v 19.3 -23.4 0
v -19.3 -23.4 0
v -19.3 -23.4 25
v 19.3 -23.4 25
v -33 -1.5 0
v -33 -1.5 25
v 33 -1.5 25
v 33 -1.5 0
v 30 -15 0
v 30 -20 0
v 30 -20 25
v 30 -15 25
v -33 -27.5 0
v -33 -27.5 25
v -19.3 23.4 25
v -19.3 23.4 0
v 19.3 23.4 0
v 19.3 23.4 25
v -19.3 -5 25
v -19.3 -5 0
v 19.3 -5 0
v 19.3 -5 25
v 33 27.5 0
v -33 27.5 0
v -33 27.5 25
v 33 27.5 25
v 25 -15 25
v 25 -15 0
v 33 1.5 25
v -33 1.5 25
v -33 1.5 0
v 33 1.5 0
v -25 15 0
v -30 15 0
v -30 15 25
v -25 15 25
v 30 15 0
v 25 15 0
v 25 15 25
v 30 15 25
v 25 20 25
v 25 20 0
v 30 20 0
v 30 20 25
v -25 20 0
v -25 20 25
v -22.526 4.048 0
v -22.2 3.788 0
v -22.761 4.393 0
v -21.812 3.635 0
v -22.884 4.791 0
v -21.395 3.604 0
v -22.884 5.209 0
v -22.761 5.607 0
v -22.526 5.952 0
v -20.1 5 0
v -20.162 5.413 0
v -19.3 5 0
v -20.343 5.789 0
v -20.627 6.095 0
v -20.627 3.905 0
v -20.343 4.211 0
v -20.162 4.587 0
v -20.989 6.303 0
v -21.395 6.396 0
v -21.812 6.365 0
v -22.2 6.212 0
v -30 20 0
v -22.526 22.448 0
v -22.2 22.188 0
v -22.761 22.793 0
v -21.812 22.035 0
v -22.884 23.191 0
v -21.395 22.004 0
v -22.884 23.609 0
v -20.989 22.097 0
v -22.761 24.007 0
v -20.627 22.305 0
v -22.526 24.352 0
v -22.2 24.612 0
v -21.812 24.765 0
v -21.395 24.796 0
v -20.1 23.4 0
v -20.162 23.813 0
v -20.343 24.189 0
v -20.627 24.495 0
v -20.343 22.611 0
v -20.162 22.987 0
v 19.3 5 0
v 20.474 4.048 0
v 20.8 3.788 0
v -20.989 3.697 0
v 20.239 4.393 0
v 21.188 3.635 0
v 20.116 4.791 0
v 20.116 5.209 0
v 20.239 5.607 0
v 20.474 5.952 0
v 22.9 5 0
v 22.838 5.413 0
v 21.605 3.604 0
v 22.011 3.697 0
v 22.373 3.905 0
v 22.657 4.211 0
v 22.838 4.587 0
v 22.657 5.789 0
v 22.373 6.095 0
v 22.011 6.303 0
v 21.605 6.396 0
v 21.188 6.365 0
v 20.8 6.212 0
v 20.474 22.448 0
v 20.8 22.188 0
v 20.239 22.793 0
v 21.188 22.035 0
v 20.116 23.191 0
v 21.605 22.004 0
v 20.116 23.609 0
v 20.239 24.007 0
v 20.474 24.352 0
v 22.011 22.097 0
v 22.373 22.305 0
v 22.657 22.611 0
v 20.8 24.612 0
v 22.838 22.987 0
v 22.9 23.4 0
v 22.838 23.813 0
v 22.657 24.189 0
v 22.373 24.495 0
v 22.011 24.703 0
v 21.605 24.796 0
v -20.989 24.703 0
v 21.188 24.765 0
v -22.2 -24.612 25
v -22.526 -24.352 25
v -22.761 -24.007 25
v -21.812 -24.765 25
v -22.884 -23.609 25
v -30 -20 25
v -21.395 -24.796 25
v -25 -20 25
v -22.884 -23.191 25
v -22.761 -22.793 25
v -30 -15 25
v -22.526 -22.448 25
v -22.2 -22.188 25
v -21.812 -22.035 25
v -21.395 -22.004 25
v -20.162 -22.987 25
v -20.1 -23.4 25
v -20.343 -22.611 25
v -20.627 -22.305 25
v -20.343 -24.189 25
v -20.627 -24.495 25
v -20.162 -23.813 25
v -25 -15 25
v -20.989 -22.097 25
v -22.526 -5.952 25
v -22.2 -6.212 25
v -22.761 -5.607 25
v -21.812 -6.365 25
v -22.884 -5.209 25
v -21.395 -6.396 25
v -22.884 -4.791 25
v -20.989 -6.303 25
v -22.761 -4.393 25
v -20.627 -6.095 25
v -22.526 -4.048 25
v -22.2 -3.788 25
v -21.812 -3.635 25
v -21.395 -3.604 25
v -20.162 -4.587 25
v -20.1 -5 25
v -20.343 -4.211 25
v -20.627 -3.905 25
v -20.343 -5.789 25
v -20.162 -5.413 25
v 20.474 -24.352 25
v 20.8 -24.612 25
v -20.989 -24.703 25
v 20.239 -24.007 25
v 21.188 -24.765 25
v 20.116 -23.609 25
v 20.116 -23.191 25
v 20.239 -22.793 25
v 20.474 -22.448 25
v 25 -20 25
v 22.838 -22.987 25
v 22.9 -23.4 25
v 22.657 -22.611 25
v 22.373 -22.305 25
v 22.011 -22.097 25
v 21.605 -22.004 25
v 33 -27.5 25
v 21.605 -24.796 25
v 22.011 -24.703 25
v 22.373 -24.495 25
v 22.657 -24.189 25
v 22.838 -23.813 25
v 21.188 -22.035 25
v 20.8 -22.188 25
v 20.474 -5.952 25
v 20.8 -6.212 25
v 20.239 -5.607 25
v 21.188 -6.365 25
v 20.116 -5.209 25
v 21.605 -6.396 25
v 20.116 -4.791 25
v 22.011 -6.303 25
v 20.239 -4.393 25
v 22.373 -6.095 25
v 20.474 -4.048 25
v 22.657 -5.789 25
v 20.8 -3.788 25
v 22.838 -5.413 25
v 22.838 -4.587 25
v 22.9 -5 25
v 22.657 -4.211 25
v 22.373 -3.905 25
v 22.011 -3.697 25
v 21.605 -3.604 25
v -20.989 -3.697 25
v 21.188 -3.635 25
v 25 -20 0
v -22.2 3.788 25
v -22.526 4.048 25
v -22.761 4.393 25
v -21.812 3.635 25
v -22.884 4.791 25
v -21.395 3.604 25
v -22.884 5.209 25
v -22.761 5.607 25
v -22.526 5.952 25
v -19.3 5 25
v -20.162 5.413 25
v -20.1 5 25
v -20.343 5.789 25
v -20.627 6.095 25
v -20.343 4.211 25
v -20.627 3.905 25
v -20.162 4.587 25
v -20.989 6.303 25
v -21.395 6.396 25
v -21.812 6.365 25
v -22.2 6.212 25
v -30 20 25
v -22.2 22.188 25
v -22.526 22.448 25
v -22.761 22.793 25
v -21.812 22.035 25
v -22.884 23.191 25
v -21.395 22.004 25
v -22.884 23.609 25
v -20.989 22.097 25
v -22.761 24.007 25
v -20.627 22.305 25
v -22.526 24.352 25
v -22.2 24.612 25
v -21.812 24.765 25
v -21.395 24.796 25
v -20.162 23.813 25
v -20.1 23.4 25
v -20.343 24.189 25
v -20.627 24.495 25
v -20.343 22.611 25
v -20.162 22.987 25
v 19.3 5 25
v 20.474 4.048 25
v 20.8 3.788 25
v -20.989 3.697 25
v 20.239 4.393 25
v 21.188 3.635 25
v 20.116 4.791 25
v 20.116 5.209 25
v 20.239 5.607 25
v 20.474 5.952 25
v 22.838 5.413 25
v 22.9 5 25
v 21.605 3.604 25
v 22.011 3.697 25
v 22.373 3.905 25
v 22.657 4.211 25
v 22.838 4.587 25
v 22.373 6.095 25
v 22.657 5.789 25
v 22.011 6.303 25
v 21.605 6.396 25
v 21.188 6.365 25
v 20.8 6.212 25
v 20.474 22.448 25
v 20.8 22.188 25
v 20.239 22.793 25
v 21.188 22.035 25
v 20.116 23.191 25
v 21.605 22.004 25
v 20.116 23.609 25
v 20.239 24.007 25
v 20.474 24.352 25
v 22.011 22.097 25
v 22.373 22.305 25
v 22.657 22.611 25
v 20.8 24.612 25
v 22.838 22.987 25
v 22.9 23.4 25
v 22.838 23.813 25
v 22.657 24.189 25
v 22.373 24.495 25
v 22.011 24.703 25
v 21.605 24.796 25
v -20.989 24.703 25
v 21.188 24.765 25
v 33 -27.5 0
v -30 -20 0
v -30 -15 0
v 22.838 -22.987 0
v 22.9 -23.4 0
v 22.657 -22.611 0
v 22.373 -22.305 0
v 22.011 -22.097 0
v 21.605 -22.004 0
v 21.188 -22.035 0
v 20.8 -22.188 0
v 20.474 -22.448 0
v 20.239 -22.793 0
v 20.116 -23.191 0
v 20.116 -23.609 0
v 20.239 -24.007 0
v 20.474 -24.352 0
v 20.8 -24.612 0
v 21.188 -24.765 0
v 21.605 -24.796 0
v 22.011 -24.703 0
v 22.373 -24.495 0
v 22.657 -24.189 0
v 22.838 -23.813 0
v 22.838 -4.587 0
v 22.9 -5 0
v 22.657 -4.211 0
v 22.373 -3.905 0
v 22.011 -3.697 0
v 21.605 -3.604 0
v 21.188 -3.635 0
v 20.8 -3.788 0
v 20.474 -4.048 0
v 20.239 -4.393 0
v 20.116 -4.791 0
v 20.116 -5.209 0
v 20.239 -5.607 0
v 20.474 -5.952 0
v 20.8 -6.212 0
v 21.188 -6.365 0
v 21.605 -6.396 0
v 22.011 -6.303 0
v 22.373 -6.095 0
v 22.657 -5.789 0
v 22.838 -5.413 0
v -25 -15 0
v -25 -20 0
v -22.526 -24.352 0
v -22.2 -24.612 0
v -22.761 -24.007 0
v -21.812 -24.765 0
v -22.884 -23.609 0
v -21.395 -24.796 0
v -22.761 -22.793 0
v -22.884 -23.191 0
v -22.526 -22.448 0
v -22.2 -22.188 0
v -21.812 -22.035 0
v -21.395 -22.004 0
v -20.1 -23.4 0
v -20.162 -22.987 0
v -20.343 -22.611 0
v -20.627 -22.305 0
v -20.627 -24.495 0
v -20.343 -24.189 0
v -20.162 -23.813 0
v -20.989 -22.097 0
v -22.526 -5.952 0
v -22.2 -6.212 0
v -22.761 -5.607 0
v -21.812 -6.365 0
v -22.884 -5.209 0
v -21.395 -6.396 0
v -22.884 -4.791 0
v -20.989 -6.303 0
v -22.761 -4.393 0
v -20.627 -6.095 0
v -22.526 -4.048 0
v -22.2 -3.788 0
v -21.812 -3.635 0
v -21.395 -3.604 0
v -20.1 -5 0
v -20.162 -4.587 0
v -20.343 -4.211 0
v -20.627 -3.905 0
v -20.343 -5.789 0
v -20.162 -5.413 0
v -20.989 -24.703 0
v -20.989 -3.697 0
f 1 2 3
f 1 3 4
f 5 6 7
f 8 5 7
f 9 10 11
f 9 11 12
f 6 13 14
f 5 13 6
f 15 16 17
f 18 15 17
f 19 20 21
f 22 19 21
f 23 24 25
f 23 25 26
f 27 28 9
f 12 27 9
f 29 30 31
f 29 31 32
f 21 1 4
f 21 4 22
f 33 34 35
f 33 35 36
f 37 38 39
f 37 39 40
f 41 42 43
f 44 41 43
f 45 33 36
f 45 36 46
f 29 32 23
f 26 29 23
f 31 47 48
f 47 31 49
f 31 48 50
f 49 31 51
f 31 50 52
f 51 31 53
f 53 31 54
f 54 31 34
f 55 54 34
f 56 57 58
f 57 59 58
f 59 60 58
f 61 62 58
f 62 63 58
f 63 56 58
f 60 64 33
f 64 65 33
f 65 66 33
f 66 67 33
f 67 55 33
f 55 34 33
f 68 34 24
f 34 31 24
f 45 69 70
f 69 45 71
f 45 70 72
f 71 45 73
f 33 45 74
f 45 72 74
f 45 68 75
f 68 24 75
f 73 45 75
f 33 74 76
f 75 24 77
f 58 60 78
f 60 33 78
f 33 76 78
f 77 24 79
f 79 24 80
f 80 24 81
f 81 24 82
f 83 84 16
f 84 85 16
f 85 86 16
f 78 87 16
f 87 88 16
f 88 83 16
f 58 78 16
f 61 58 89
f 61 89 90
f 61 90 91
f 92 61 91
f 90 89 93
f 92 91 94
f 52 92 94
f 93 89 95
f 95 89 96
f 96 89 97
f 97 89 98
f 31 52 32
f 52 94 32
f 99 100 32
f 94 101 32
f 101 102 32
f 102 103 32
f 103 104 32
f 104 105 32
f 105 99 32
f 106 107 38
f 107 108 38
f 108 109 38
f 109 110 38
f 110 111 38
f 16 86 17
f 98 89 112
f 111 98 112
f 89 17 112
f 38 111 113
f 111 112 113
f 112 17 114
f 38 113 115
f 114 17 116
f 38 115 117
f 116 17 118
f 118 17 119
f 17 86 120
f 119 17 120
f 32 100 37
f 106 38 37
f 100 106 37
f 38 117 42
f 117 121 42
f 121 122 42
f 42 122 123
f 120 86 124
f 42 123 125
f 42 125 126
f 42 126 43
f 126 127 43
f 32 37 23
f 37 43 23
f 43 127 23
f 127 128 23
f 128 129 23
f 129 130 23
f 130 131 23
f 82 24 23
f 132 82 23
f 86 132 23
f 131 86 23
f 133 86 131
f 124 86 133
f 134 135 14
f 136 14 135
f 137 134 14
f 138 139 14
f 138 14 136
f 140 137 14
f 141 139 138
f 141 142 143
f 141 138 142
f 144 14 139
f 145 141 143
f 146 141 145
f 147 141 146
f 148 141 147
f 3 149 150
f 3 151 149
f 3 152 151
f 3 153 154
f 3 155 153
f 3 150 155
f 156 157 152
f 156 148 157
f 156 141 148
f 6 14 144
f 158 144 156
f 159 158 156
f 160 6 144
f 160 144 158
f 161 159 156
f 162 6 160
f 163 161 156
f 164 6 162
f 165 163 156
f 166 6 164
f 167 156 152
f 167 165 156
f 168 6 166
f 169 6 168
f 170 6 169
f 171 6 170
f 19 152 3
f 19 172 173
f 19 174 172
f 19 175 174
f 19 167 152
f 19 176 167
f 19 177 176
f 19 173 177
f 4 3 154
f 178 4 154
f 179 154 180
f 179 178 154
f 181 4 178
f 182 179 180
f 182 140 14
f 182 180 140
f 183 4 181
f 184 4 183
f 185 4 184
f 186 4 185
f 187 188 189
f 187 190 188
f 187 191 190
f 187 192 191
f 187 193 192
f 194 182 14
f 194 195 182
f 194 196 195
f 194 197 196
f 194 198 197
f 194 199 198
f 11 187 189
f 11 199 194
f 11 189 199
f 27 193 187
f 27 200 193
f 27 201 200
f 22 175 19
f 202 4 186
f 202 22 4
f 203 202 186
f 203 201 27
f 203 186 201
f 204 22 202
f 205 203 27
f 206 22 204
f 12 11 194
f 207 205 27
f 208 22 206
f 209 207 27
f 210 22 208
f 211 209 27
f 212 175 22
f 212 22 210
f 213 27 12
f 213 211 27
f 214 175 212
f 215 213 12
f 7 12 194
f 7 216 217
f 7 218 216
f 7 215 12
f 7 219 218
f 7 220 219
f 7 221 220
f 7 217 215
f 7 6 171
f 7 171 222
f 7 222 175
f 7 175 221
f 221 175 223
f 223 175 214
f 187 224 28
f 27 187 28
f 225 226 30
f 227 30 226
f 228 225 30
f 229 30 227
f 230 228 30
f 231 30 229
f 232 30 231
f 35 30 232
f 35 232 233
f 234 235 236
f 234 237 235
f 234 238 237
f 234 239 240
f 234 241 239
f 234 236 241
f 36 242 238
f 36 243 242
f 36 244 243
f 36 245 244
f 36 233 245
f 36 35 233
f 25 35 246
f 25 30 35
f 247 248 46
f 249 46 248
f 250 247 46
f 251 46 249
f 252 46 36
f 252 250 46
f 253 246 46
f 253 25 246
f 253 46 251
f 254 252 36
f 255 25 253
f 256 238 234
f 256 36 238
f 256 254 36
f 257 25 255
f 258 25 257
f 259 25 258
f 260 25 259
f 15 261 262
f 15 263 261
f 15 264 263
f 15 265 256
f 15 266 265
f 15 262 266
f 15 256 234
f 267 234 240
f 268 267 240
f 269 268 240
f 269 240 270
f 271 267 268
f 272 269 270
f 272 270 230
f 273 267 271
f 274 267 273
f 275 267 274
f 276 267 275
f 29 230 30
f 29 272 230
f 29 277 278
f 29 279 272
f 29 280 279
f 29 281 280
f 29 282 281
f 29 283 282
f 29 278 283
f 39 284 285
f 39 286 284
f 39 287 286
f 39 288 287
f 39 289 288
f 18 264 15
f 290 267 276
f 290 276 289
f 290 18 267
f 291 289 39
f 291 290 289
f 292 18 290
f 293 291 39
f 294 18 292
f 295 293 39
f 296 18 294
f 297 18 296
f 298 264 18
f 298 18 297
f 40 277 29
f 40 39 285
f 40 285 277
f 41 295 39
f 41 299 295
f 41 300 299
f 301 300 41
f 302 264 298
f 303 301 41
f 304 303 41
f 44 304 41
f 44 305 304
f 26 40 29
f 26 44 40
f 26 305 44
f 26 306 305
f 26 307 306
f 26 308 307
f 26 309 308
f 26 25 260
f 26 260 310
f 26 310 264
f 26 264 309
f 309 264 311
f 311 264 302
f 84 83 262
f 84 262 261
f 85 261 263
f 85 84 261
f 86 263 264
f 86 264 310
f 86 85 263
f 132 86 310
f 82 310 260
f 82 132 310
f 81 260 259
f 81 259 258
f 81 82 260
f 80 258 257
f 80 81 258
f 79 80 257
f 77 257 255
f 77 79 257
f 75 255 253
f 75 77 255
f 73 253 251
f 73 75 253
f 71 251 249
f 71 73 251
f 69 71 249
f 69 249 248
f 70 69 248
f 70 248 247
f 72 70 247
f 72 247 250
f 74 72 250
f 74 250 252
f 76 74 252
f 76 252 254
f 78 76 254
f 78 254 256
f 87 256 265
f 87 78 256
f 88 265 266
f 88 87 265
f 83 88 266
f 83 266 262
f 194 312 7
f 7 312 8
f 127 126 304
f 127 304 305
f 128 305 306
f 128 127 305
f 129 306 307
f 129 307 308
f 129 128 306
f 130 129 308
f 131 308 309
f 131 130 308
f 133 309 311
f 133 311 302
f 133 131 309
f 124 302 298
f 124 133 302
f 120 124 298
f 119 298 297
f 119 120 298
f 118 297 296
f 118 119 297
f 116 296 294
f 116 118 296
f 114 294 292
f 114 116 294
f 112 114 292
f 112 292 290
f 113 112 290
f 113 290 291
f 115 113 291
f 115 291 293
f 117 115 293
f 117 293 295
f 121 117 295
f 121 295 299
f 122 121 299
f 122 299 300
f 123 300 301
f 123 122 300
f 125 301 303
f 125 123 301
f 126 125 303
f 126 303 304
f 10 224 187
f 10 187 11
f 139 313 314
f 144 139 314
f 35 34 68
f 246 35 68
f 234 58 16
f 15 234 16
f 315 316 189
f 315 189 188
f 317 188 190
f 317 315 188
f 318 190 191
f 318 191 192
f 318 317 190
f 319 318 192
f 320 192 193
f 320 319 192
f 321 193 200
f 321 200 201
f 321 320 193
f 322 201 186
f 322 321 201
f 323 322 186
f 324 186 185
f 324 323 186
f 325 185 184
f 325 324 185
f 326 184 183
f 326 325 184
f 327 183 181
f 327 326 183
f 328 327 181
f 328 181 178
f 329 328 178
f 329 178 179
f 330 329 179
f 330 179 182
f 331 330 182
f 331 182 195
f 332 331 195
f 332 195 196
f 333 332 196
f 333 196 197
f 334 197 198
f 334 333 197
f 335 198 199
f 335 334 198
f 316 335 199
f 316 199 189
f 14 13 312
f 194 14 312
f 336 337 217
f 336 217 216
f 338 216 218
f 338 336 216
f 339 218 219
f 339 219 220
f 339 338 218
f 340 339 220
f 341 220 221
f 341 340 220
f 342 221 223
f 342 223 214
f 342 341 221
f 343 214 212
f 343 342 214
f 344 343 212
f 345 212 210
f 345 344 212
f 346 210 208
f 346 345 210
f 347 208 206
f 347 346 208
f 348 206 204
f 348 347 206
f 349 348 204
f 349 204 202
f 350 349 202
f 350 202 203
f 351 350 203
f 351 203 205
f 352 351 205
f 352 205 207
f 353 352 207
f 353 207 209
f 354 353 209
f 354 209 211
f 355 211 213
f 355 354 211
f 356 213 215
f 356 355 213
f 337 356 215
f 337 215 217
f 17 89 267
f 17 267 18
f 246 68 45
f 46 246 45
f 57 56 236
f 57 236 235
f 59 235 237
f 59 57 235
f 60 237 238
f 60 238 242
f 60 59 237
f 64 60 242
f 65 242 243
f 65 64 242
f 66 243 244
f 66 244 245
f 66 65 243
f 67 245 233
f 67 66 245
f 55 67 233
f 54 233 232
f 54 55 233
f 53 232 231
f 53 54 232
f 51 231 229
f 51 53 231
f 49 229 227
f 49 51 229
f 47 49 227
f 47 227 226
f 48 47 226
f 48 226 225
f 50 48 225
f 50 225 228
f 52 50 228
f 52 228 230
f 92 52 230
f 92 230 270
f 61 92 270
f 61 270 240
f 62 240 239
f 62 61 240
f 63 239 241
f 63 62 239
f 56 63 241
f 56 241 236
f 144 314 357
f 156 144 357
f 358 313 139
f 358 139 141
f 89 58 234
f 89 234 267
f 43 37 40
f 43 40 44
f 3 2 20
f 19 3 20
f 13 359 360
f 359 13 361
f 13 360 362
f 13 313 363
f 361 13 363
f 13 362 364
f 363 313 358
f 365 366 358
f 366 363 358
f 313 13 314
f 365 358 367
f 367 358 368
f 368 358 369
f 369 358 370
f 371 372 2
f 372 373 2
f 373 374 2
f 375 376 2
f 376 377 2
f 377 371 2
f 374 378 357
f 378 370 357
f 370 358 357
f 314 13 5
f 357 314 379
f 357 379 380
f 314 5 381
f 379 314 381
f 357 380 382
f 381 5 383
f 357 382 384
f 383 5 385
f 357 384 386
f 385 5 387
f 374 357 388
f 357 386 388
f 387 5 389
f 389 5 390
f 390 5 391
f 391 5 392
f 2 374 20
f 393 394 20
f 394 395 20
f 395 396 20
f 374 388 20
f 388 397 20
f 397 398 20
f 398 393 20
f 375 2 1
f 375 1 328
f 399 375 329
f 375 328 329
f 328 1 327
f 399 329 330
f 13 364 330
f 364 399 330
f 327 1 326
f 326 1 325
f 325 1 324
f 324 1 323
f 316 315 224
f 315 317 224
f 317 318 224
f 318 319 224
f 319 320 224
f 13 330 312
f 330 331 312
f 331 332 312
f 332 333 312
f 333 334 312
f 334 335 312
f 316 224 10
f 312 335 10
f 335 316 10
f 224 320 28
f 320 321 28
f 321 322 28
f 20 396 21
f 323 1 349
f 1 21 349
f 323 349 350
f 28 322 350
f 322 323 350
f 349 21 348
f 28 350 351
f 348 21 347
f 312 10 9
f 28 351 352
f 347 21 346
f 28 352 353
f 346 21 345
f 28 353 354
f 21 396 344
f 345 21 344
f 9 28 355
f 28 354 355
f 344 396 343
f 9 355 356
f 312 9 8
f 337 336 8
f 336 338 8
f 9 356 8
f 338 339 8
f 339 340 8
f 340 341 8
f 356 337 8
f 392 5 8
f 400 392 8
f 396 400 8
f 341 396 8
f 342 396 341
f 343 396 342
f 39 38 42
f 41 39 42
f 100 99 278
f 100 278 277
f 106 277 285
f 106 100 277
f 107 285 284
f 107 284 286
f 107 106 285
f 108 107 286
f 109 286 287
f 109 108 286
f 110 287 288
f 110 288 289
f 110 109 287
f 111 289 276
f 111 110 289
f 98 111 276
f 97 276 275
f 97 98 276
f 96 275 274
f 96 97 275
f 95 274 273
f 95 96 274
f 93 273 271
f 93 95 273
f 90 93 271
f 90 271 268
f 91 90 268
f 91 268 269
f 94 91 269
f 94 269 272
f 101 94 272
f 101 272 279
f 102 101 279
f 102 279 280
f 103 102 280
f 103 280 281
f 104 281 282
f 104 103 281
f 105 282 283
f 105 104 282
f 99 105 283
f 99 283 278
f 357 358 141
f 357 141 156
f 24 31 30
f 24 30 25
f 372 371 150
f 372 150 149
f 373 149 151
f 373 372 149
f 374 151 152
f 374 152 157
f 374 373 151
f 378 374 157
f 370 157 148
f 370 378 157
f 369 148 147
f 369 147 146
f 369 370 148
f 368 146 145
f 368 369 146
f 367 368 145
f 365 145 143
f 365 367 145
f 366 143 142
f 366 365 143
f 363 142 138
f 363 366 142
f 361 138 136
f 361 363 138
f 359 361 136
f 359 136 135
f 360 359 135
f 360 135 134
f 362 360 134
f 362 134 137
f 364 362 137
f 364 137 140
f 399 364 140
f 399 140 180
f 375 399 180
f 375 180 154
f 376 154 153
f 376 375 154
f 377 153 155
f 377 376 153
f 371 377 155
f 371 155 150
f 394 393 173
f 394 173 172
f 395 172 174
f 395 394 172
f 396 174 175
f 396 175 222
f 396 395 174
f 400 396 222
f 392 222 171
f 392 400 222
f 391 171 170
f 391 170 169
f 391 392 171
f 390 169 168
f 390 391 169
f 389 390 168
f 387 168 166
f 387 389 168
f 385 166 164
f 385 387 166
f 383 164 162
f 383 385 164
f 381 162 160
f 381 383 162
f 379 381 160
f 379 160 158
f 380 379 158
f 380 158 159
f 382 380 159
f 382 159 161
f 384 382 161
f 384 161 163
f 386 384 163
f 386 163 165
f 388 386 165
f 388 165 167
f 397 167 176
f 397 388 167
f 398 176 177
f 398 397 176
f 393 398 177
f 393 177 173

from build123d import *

# Parameters (mm, degrees)
F0_W     = 66
F0_H     = 55
F0_R     = 1.4
F0_W_2   = 5
F0_H_2   = 5
F0_W_3   = 38.6
F0_H_3   = 18.4
F1_DEPTH = 25
F2_W     = 66
F2_H     = 3
F3_DEPTH = 25


with BuildPart() as f1:
    # F0 (on Top) → F1 (new body)
    with BuildSketch(Plane.XY):
        Rectangle(F0_W, F0_H)
        with Locations((-21.5, -23.4)):
            Circle(F0_R, mode=Mode.SUBTRACT)
        with Locations((-27.5, -17.5)):
            Rectangle(F0_W_2, F0_H_2, mode=Mode.SUBTRACT)
        with Locations((-21.5, -5)):
            Circle(F0_R, mode=Mode.SUBTRACT)
        with Locations((0, -14.2)):
            Rectangle(F0_W_3, F0_H_3, mode=Mode.SUBTRACT)
        with Locations((21.5, -23.4)):
            Circle(F0_R, mode=Mode.SUBTRACT)
        with Locations((27.5, -17.5)):
            Rectangle(F0_W_2, F0_H_2, mode=Mode.SUBTRACT)
        with Locations((21.5, -5)):
            Circle(F0_R, mode=Mode.SUBTRACT)
        with Locations((-21.5, 5)):
            Circle(F0_R, mode=Mode.SUBTRACT)
        with Locations((-27.5, 17.5)):
            Rectangle(F0_W_2, F0_H_2, mode=Mode.SUBTRACT)
        with Locations((-21.5, 23.4)):
            Circle(F0_R, mode=Mode.SUBTRACT)
        with Locations((21.5, 5)):
            Circle(F0_R, mode=Mode.SUBTRACT)
        with Locations((0, 14.2)):
            Rectangle(F0_W_3, F0_H_3, mode=Mode.SUBTRACT)
        with Locations((27.5, 17.5)):
            Rectangle(F0_W_2, F0_H_2, mode=Mode.SUBTRACT)
        with Locations((21.5, 23.4)):
            Circle(F0_R, mode=Mode.SUBTRACT)
    extrude(amount=F1_DEPTH)

    # F2 (on face) → F3 (cut)
    with BuildSketch(Plane.XY.offset(25)):
        Rectangle(F2_W, F2_H)
    extrude(amount=-F3_DEPTH, mode=Mode.SUBTRACT)


solid = f1.part
